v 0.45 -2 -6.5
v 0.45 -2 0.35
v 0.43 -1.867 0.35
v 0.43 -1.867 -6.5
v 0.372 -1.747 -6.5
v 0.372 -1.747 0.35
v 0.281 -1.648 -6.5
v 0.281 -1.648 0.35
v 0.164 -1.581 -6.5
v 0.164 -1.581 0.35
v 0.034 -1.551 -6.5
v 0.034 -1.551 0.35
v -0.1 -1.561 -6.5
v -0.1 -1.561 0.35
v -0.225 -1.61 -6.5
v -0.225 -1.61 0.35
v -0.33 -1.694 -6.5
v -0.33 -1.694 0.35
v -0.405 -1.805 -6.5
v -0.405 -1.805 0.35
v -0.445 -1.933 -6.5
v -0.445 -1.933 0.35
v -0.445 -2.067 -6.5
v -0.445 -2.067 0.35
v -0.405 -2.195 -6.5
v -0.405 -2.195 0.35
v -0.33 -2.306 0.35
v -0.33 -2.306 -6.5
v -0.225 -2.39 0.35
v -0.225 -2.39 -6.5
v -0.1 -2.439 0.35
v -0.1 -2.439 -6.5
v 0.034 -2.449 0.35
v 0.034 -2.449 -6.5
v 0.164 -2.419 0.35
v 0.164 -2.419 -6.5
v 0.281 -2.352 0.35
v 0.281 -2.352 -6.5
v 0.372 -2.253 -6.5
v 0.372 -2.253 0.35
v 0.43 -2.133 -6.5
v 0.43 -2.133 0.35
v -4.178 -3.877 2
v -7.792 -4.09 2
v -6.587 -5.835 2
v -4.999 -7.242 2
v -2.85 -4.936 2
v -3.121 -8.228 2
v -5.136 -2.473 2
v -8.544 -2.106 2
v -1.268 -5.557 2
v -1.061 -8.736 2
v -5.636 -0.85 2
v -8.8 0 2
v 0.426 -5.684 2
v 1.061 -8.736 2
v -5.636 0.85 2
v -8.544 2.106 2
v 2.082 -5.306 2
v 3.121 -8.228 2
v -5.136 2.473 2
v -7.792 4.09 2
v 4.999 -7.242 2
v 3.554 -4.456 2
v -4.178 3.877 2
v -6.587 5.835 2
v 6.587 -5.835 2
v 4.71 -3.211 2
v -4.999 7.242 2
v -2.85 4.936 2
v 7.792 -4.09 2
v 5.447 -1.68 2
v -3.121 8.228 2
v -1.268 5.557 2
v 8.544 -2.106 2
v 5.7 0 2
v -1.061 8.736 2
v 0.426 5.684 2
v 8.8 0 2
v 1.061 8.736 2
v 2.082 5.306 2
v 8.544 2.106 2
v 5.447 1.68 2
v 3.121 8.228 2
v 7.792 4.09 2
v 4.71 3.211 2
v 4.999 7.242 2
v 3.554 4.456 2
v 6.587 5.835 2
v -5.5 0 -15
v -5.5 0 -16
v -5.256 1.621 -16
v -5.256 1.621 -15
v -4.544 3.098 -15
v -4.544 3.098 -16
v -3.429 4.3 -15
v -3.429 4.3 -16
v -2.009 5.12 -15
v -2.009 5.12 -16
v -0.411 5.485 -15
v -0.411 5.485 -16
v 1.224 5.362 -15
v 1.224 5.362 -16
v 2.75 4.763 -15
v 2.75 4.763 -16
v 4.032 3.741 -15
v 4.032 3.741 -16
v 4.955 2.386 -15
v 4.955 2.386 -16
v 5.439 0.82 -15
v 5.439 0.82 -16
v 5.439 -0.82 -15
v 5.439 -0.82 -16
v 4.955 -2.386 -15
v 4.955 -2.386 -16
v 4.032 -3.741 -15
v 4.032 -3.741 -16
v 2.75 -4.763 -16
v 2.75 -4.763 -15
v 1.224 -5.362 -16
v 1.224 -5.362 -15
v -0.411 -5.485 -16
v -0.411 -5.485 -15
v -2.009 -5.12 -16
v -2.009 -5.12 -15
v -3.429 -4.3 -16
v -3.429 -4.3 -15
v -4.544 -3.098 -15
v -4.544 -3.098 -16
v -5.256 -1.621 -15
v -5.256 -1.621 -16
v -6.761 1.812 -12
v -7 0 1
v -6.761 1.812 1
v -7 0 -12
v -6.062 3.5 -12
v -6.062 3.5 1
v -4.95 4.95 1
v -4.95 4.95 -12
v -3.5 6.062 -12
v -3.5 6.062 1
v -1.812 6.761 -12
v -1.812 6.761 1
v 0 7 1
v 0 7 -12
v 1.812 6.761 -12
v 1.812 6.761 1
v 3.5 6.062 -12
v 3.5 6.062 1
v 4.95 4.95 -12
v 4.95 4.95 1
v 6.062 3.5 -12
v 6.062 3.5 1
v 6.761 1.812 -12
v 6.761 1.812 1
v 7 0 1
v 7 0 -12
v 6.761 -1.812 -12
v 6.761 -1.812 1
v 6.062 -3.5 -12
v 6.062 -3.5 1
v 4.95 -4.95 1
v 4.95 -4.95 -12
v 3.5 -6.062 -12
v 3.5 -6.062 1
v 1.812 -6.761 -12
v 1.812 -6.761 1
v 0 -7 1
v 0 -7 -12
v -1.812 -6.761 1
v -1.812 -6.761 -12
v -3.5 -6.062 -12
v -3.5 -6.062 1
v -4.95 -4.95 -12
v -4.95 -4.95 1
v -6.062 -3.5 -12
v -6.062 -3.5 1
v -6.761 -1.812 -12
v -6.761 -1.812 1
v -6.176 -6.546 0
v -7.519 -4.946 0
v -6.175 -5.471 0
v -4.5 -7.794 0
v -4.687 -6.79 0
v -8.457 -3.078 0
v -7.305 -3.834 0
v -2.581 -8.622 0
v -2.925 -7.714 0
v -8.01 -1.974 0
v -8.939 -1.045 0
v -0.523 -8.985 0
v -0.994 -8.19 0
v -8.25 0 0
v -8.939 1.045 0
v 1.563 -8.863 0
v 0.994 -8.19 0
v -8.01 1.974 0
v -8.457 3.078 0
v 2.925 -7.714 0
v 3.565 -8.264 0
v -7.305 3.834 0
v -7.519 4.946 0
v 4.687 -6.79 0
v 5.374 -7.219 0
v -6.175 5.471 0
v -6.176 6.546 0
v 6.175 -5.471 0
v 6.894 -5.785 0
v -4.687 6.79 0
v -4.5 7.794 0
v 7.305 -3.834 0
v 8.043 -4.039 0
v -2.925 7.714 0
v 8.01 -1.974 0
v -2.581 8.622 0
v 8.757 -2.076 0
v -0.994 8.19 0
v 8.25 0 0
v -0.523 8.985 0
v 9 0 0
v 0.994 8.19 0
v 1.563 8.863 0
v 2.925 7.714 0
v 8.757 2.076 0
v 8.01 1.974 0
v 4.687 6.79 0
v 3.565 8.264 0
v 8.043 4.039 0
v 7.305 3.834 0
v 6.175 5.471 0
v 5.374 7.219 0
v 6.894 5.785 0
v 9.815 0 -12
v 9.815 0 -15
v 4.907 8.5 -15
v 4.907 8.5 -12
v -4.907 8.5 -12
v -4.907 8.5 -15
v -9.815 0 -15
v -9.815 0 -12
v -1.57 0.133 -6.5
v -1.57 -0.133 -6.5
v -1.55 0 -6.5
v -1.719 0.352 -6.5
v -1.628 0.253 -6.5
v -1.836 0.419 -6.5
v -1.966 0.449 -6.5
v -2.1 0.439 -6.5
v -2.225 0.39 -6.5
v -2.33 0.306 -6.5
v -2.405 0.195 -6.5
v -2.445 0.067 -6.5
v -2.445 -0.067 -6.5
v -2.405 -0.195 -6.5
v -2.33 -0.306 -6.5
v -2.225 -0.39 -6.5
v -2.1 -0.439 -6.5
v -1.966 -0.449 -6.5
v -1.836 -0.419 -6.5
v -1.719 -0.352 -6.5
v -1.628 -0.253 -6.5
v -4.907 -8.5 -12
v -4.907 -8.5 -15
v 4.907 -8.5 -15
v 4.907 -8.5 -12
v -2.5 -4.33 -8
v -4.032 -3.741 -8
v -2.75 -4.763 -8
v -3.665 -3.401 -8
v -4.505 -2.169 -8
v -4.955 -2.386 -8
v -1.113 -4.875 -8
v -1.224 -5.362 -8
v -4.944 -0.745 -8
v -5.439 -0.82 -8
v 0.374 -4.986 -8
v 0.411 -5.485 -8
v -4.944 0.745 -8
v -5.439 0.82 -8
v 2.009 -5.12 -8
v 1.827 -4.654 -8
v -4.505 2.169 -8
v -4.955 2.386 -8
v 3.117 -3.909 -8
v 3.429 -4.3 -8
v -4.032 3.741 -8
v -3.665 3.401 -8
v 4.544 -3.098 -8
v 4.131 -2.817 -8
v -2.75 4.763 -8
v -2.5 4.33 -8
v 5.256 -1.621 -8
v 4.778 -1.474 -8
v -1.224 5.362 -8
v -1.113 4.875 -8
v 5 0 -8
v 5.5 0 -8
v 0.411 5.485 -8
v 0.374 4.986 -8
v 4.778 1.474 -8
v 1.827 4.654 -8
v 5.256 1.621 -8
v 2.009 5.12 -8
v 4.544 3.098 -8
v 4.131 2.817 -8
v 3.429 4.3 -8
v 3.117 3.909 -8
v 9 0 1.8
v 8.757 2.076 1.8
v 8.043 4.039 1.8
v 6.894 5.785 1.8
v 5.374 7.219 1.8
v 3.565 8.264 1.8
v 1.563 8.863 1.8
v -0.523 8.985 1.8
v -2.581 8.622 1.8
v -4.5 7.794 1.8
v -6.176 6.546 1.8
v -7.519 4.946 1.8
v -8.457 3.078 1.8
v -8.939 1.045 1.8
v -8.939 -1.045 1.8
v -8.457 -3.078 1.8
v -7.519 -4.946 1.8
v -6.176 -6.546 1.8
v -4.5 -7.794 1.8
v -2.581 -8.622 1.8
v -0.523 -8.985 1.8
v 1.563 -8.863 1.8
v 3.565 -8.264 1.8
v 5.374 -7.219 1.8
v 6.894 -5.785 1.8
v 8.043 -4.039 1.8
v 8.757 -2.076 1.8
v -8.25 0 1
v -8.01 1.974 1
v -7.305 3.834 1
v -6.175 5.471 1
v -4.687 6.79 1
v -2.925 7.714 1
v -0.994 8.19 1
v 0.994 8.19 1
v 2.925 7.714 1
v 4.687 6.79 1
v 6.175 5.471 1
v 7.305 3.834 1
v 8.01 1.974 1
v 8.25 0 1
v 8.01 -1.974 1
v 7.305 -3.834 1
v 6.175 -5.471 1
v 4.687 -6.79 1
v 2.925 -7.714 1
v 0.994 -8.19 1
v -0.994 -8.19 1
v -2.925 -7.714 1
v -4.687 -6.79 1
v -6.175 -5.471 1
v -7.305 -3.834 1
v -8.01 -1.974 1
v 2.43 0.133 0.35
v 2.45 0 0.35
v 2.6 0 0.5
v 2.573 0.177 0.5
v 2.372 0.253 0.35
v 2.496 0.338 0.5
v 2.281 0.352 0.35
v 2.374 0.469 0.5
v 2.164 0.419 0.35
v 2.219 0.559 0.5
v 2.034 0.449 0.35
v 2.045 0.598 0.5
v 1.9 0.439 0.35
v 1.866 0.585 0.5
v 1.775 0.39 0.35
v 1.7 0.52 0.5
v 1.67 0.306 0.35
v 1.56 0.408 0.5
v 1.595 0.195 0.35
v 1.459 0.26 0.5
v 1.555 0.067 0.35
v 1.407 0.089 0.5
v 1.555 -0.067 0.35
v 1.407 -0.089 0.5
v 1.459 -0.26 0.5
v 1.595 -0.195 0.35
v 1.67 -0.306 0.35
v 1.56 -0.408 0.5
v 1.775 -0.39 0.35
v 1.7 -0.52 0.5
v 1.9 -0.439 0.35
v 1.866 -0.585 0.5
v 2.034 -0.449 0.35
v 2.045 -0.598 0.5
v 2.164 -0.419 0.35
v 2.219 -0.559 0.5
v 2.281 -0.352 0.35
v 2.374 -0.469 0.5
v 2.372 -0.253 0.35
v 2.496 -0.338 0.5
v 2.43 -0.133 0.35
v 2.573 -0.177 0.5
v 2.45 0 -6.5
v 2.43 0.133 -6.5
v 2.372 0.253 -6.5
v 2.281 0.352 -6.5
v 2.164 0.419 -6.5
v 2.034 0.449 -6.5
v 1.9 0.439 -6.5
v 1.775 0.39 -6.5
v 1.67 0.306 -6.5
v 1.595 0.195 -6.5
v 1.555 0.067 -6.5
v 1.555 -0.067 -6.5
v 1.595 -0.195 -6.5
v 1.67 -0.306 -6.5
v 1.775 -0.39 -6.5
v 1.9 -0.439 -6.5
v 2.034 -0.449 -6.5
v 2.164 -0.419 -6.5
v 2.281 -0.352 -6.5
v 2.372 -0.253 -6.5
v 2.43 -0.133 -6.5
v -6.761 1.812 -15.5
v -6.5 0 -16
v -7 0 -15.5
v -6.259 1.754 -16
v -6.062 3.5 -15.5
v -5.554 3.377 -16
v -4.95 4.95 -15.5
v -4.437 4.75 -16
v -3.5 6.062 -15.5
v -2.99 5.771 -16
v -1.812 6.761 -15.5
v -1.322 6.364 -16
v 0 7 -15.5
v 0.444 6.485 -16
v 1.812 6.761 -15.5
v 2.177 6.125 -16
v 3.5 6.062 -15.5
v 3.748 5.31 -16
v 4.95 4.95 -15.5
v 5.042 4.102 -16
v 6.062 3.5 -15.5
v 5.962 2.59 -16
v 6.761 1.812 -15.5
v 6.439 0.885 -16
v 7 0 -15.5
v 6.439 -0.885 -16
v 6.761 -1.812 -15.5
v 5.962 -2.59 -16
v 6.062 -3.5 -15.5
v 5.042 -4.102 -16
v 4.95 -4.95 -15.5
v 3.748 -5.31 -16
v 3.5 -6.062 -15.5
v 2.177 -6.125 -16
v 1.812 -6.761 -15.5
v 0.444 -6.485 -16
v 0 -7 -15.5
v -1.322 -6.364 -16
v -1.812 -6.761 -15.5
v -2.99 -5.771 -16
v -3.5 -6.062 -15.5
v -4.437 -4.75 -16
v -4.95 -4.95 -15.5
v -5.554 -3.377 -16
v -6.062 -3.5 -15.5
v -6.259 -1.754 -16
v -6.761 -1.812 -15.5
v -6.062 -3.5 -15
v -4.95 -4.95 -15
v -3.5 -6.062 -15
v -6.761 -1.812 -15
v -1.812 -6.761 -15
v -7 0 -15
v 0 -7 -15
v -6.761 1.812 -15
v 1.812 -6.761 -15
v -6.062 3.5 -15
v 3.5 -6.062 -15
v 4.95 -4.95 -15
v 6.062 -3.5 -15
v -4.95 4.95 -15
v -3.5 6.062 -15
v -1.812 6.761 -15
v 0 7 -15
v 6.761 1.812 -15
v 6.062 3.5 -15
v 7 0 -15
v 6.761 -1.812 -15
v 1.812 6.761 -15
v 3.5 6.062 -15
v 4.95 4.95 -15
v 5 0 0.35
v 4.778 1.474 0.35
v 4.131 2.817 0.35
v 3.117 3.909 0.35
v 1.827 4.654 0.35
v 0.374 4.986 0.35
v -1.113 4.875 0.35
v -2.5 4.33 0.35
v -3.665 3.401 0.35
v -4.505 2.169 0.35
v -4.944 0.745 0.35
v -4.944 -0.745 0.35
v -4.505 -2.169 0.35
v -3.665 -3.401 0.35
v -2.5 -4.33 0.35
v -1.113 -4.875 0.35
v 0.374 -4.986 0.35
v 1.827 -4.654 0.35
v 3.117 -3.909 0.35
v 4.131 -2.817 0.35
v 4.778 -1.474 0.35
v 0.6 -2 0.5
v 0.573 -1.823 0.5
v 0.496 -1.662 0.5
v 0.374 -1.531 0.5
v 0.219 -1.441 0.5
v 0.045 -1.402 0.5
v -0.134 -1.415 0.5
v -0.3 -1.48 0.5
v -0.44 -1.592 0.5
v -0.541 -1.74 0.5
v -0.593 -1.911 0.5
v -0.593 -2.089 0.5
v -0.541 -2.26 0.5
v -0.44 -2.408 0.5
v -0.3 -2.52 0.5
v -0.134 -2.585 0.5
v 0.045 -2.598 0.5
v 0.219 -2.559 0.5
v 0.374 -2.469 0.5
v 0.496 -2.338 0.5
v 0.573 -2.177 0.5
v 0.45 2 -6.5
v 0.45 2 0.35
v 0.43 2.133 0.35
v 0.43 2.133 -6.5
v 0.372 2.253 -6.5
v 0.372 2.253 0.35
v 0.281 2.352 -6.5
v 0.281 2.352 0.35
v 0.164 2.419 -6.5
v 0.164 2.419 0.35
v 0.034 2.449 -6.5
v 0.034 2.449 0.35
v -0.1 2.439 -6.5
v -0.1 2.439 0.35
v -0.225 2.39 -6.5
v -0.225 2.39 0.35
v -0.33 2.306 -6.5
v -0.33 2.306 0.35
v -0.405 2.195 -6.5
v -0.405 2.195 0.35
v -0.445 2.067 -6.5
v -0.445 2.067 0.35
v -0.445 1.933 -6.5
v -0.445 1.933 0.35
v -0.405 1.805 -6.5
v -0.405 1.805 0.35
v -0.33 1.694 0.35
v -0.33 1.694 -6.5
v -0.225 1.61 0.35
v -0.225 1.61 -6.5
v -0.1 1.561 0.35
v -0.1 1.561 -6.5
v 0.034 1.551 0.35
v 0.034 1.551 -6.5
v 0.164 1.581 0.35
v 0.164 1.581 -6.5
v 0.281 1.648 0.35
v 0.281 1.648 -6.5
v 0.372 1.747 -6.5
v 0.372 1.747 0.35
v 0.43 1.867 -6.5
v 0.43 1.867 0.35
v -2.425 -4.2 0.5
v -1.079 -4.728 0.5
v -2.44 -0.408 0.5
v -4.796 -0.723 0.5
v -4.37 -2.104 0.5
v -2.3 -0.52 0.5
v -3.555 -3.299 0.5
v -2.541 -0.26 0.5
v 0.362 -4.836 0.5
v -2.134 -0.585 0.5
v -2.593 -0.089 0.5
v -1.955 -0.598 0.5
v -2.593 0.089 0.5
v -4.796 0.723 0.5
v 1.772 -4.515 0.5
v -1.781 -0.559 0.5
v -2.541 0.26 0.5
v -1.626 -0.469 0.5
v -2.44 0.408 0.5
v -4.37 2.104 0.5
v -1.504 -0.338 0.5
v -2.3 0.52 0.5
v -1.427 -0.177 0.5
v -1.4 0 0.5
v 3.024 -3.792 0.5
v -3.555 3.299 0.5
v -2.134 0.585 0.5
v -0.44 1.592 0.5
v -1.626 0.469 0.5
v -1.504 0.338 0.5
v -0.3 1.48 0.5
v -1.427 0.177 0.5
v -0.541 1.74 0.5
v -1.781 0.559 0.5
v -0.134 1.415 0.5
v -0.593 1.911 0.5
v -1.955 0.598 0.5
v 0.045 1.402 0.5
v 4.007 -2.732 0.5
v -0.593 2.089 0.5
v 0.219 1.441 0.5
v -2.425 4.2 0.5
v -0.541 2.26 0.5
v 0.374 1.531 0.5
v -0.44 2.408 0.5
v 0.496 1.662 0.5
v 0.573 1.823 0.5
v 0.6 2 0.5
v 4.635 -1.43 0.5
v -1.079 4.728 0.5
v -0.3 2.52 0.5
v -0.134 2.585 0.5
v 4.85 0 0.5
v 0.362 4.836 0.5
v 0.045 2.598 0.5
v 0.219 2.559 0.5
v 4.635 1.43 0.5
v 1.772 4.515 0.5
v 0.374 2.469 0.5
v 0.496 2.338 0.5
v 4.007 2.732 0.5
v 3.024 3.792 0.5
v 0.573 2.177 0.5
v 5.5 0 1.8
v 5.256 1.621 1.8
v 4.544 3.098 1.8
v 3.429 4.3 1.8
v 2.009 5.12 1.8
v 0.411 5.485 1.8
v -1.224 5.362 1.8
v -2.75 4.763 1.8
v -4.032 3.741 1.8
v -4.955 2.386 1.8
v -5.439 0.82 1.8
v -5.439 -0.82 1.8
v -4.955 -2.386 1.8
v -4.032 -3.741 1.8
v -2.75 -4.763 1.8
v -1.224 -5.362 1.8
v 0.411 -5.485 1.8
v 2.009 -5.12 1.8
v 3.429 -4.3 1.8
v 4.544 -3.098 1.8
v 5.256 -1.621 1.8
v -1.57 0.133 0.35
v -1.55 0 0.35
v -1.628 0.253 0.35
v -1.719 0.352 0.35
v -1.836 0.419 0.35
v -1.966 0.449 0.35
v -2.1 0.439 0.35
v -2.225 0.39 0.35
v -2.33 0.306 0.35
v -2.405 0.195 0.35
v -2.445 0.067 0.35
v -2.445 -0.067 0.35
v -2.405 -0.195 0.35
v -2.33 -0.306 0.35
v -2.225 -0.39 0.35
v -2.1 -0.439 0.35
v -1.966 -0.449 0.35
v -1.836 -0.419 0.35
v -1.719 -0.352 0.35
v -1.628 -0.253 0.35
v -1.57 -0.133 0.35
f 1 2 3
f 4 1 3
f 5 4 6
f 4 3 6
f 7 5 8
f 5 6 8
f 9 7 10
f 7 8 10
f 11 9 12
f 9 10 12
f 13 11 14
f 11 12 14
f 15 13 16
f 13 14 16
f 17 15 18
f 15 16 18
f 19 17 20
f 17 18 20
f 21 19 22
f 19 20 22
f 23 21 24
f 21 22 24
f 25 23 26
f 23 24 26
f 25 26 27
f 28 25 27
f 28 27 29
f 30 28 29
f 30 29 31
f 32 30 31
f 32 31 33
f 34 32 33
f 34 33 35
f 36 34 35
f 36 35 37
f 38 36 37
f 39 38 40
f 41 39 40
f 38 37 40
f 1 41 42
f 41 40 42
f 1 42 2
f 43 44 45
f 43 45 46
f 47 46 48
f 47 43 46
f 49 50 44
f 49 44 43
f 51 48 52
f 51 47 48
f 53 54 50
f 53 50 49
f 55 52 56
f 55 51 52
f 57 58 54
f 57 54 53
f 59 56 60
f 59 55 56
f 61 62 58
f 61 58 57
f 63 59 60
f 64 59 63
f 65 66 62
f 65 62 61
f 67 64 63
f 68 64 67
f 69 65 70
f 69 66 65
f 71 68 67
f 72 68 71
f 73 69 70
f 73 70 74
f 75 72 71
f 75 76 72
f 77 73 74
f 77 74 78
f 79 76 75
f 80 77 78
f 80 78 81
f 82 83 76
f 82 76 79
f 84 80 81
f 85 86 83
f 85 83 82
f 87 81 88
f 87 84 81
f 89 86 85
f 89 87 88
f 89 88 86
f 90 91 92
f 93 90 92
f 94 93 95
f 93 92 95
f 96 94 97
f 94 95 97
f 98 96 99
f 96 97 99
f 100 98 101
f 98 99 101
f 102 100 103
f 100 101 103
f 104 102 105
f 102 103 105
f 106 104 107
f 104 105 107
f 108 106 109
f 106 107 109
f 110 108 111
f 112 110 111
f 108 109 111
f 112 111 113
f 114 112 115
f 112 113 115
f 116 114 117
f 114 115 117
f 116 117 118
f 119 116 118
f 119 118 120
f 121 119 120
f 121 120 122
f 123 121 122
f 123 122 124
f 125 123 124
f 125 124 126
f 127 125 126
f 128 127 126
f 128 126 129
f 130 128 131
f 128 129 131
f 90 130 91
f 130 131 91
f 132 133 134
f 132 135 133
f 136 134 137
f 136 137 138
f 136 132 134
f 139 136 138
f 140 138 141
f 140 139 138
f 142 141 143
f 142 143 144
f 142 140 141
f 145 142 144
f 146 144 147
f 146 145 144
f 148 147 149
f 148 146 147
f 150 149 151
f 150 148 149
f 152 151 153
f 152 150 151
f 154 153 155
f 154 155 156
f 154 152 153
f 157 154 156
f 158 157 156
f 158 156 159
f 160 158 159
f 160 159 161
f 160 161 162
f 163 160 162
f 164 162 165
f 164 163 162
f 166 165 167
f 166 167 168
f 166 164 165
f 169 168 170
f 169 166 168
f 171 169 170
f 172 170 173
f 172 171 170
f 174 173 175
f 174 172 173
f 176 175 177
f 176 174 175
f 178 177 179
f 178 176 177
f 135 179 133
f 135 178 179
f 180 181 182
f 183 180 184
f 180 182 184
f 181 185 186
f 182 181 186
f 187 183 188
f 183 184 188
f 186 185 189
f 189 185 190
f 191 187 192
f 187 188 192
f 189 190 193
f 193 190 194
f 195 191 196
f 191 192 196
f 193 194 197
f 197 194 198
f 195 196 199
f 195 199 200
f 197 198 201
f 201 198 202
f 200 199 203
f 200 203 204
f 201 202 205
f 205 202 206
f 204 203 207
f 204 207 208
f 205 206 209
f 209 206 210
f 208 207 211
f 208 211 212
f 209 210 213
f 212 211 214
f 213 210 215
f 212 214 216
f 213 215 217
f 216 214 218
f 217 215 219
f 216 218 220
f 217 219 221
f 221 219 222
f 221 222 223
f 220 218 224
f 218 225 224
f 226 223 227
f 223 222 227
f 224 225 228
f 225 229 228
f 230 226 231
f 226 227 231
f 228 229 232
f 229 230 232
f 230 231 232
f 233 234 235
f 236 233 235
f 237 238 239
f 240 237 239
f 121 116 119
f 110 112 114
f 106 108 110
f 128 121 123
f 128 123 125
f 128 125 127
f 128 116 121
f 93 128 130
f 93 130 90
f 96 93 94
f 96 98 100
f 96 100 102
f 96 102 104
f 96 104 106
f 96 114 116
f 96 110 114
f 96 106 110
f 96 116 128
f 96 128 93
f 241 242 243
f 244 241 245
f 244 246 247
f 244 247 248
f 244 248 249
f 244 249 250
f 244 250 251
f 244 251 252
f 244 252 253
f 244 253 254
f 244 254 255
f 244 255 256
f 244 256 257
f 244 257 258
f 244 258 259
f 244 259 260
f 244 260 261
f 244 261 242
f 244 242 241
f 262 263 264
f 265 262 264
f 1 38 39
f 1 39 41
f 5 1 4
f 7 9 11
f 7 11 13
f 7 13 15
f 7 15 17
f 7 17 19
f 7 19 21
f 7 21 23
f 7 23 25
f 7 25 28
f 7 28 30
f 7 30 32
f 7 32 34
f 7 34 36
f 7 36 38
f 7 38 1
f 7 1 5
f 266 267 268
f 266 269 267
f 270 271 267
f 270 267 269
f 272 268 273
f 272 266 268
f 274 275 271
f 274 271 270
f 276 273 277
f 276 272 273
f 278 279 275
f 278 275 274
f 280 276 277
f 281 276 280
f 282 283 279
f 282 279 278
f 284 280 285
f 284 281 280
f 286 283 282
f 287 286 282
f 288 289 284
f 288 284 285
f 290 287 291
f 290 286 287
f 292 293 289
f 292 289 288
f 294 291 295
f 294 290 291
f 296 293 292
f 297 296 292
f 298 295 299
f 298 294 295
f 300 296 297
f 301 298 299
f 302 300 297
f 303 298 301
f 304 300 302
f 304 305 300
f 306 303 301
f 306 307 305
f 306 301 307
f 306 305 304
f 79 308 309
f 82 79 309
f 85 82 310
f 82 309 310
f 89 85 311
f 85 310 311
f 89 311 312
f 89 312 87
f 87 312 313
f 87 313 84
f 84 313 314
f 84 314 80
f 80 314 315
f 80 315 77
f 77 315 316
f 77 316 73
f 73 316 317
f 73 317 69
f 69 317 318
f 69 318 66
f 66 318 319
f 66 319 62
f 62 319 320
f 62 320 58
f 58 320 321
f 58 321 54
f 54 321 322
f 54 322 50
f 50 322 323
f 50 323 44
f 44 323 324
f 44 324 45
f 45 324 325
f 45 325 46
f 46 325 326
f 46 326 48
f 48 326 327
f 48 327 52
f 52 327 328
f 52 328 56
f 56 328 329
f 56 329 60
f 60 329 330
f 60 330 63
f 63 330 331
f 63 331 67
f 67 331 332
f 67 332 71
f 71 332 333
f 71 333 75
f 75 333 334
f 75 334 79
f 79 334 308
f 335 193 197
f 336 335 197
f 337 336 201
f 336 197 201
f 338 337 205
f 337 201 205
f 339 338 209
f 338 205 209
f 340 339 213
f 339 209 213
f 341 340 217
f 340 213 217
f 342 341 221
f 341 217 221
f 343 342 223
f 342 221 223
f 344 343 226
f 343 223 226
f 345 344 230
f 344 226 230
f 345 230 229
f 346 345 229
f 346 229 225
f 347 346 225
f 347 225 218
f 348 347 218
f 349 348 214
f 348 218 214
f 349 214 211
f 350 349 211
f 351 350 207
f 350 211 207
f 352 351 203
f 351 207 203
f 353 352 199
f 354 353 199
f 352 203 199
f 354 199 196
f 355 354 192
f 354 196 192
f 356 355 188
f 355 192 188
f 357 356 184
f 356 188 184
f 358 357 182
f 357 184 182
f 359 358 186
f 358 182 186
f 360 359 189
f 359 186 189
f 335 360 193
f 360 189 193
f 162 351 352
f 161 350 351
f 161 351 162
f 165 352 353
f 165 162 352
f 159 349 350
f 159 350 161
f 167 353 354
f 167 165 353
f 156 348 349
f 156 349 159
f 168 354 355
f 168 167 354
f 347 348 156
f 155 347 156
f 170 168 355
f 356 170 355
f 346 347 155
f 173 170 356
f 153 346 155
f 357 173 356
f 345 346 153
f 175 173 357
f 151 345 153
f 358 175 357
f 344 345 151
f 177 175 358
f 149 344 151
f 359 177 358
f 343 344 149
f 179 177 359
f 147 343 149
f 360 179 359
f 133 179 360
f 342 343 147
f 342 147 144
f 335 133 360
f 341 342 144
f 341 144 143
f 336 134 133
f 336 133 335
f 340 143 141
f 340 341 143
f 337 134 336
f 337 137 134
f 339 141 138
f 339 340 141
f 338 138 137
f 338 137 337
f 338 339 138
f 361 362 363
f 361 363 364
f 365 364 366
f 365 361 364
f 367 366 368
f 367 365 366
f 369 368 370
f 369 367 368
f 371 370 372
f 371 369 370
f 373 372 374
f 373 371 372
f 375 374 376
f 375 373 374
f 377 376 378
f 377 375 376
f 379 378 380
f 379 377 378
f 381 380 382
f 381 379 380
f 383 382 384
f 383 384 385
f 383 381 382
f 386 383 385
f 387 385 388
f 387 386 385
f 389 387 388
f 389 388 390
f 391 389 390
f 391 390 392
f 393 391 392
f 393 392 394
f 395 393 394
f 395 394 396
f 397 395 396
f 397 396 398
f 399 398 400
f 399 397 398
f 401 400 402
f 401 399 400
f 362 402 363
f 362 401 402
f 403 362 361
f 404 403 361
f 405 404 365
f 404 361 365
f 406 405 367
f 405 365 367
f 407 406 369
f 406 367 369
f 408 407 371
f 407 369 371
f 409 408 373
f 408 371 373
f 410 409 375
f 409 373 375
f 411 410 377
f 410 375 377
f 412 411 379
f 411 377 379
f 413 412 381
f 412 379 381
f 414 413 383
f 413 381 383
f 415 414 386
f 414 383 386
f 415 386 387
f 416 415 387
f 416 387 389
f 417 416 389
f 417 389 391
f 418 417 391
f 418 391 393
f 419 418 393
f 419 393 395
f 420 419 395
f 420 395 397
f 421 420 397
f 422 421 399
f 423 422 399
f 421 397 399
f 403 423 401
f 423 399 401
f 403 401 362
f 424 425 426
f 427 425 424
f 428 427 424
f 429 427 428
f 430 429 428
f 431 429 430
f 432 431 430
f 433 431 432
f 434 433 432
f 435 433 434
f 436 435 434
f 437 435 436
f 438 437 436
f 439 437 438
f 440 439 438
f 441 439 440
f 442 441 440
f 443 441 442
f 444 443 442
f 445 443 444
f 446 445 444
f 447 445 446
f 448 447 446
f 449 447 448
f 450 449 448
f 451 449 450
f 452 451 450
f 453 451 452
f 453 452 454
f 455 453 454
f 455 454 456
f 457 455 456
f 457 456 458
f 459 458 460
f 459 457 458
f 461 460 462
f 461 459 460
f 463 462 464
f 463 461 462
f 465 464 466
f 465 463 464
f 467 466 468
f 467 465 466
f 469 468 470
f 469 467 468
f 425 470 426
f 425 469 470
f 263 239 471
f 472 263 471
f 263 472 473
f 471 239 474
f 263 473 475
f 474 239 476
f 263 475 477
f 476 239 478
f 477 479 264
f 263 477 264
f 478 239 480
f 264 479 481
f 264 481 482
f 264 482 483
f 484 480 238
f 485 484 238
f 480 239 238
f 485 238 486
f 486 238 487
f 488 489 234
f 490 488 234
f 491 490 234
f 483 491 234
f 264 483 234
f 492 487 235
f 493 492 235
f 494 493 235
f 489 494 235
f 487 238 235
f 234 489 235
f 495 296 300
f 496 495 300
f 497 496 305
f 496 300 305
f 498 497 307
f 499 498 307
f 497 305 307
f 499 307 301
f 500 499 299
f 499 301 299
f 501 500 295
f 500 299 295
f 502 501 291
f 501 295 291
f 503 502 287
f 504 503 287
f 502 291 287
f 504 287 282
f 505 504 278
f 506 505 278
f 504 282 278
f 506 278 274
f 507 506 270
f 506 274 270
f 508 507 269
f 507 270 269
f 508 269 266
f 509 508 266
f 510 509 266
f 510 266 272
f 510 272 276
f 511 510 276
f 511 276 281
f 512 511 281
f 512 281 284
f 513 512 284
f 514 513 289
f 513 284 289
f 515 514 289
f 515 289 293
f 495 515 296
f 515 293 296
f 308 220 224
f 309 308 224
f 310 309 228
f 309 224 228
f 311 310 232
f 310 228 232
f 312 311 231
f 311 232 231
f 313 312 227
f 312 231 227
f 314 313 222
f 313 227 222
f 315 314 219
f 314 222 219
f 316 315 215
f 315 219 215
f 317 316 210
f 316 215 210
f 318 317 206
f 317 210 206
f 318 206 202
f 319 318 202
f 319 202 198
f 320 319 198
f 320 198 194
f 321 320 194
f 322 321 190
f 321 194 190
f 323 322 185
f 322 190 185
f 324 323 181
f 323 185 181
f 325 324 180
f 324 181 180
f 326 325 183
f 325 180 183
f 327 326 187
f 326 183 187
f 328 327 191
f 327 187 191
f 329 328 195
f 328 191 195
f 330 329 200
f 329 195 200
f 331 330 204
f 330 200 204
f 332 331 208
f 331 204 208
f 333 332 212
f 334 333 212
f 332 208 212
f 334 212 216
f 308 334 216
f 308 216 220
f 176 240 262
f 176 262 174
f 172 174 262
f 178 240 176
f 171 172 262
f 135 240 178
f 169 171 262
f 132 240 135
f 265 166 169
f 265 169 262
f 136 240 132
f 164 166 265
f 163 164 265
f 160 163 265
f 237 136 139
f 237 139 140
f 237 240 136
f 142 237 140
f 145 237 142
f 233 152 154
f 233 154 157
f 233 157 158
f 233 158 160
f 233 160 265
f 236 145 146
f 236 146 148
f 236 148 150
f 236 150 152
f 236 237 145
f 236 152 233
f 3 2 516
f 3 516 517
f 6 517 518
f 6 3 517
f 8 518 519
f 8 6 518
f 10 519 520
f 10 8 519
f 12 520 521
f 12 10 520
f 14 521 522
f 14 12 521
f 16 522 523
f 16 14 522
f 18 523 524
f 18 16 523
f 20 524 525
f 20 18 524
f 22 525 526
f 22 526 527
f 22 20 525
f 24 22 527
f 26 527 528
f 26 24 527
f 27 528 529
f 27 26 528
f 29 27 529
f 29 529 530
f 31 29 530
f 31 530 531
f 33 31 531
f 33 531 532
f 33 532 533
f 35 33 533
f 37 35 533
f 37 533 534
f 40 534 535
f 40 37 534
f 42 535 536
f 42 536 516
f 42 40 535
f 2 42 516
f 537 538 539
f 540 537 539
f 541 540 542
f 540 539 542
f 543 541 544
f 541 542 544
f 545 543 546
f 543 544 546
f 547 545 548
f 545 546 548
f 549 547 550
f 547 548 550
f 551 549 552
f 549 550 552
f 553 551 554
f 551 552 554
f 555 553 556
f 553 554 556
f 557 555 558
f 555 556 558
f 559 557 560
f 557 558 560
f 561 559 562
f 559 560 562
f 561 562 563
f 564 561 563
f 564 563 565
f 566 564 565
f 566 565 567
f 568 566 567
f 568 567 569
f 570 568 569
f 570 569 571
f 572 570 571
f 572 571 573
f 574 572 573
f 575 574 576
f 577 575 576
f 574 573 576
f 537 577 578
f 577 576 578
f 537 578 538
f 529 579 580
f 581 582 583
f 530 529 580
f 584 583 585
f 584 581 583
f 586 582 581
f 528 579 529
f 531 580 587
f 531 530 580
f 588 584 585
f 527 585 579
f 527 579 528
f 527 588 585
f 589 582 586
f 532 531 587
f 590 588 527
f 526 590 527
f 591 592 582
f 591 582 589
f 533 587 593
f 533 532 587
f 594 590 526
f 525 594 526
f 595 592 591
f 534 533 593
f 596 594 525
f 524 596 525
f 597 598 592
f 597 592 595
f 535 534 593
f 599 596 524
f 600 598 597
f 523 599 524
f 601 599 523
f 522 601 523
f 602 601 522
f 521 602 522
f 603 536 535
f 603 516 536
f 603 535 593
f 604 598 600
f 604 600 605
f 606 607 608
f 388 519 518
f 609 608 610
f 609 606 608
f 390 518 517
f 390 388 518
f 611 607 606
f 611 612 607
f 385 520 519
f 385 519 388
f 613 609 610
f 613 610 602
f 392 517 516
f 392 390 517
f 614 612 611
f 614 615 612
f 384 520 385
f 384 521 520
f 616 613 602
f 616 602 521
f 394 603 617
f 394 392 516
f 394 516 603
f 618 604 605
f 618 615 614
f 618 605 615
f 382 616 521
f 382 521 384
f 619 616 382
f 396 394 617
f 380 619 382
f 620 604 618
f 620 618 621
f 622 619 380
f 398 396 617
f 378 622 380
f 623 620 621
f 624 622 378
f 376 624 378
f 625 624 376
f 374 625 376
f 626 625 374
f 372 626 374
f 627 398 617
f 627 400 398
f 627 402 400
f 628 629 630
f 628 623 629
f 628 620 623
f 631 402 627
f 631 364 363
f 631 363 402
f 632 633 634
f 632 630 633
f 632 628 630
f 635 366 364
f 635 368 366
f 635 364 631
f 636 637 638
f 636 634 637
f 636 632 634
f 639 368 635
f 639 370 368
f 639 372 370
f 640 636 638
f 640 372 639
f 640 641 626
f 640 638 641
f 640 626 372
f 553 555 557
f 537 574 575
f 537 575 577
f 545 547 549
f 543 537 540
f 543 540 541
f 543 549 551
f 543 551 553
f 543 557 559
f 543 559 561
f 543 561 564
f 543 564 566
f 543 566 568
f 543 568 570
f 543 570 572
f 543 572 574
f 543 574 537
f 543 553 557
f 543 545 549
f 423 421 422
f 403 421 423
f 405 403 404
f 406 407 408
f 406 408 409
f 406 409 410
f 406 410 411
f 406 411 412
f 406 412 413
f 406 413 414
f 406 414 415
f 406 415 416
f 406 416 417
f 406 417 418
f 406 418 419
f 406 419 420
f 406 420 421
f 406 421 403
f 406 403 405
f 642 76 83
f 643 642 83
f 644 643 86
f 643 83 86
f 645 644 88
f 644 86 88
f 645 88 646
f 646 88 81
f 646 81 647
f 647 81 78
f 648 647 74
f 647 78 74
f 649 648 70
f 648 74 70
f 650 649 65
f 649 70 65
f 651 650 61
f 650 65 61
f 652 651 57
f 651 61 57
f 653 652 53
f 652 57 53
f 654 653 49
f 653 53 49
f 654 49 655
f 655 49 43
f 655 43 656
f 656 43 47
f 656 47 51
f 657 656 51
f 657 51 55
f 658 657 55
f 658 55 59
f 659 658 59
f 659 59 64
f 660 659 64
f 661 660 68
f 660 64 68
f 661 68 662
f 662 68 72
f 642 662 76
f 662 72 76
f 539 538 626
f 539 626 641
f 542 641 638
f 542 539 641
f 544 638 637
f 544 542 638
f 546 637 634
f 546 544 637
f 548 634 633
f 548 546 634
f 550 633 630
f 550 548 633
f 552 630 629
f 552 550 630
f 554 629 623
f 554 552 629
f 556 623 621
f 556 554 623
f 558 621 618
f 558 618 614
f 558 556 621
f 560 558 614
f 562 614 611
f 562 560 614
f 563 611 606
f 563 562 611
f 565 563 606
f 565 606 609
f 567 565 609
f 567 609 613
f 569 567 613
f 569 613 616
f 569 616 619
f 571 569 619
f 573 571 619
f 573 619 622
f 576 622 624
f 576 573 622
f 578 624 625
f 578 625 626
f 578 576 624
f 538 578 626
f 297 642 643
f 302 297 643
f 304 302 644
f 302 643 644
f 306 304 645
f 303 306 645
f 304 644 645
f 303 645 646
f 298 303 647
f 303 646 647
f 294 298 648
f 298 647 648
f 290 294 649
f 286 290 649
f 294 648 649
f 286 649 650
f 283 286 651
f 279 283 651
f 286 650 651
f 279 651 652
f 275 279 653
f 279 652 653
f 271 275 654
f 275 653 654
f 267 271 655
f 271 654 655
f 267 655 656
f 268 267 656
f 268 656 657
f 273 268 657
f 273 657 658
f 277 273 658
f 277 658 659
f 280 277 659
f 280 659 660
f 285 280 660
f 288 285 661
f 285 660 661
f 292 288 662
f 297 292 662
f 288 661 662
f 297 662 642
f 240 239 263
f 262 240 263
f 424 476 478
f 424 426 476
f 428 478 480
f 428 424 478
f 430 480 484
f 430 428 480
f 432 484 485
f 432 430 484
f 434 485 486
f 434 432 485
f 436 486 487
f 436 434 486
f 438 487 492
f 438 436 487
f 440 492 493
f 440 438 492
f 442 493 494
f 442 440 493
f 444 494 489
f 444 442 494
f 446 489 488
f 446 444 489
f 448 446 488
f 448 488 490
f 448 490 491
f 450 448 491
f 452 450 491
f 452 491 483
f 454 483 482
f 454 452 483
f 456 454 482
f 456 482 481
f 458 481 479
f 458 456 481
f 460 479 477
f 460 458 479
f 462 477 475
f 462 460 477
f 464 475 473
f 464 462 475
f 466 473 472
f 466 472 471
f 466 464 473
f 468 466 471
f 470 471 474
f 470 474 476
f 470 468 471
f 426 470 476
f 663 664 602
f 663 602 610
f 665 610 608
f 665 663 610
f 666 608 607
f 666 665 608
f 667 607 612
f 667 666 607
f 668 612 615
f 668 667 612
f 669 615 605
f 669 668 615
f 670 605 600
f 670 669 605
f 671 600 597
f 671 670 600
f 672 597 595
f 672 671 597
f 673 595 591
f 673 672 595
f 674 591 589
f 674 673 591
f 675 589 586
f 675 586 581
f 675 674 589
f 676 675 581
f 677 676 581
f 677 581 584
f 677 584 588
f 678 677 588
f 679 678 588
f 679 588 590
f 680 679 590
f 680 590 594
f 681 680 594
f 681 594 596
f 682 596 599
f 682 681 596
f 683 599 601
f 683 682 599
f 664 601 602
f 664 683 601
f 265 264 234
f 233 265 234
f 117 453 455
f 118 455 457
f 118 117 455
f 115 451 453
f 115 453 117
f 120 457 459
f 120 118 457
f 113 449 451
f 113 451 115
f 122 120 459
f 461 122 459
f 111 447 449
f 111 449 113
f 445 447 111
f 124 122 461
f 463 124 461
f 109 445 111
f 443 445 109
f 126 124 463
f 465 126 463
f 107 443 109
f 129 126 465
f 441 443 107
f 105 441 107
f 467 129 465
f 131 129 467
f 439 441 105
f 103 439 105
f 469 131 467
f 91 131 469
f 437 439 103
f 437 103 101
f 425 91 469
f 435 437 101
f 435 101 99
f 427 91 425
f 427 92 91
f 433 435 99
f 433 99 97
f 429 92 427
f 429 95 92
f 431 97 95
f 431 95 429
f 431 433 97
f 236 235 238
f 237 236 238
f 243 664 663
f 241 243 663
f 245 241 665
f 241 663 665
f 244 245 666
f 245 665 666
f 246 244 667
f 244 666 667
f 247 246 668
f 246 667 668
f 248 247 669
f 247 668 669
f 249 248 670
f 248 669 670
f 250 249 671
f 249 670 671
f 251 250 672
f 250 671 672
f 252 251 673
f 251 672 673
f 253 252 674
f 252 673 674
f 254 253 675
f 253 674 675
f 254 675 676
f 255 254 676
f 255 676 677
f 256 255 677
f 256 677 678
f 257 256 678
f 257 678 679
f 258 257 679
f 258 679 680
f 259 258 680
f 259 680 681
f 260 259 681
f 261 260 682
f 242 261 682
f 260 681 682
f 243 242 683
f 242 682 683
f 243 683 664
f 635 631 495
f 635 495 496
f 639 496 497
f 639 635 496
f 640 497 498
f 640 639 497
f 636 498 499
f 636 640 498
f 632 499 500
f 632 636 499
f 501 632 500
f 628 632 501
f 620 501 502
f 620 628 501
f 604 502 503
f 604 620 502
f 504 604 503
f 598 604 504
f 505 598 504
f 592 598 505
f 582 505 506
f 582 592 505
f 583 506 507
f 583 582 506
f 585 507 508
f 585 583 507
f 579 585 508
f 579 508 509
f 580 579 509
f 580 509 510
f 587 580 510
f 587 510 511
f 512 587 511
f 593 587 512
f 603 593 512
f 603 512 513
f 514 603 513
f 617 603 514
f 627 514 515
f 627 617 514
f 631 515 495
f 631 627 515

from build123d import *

# Parameters (mm, degrees)
SKETCH1_R          = 9
EXTRUDE1_DEPTH     = 2
SKETCH4_R          = 7
EXTRUDE2_DEPTH     = 16
SKETCH2_R          = 5.5
CUT_EXTRUDE1_DEPTH = 10
SKETCH3_R          = 8.25
SKETCH3_R_2        = 7
CUT_EXTRUDE2_DEPTH = 1
SKETCH5_R          = 5
EXTRUDE3_DEPTH     = 8.5
SKETCH6_R          = 0.45
CUT_EXTRUDE3_DEPTH = 7
CHAMFER2_SIZE      = 0.15
CHAMFER1_SIZE      = 0.2
SKETCH7_R          = 5.5
CUT_EXTRUDE4_DEPTH = 1
CHAMFER3_SIZE      = 0.5
EXTRUDE4_DEPTH     = 3


with BuildPart() as part:
    # Sketch1 → Extrude1 (new body)
    with BuildSketch(Plane.XY):
        Circle(SKETCH1_R)
    extrude(amount=EXTRUDE1_DEPTH)

    # Sketch4 → Extrude2 (add)
    with BuildSketch(Plane(origin=(0, 0, 0), x_dir=(-1, 0, 0), z_dir=(0, 0, -1))):
        Circle(SKETCH4_R)
    extrude(amount=EXTRUDE2_DEPTH)

    # Sketch2 → Cut-Extrude1 (cut)
    with BuildSketch(Plane.XY.offset(2)):
        Circle(SKETCH2_R)
    extrude(amount=-CUT_EXTRUDE1_DEPTH, mode=Mode.SUBTRACT)

    # Sketch3 → Cut-Extrude2 (cut)
    with BuildSketch(Plane(origin=(0, 0, 0), x_dir=(-1, 0, 0), z_dir=(0, 0, -1))):
        Circle(SKETCH3_R)
        Circle(SKETCH3_R_2, mode=Mode.SUBTRACT)
    extrude(amount=-CUT_EXTRUDE2_DEPTH, mode=Mode.SUBTRACT)

    # Sketch5 → Extrude3 (add)
    with BuildSketch(Plane.XY.offset(-8)):
        Circle(SKETCH5_R)
    extrude(amount=EXTRUDE3_DEPTH)

    # Sketch6 → Cut-Extrude3 (cut)
    with BuildSketch(Plane.XY.offset(0.5)):
        with Locations((0, 2)):
            Circle(SKETCH6_R)
        with Locations((0, -2)):
            Circle(SKETCH6_R)
        with Locations((2, 0)):
            Circle(SKETCH6_R)
        with Locations((-2, 0)):
            Circle(SKETCH6_R)
    extrude(amount=-CUT_EXTRUDE3_DEPTH, mode=Mode.SUBTRACT)

    # Chamfer2
    chamfer2_edges = [part.edges().sort_by_distance(p)[0] for p in [
        (-5, 0, 0.5),
        (-0.45, 2, 0.5),
        (-0.45, -2, 0.5),
        (1.55, 0, 0.5),
        (-2.45, 0, 0.5),
    ]]
    chamfer(chamfer2_edges, length=CHAMFER2_SIZE)

    # Chamfer1
    chamfer1_edges = [part.edges().sort_by_distance(p)[0] for p in [
        (-5.5, 0, 2),
        (-9, 0, 2),
    ]]
    chamfer(chamfer1_edges, length=CHAMFER1_SIZE)

    # Sketch7 → Cut-Extrude4 (cut)
    with BuildSketch(Plane(origin=(0, 0, -16), x_dir=(-1, 0, 0), z_dir=(0, 0, -1))):
        Circle(SKETCH7_R)
    extrude(amount=-CUT_EXTRUDE4_DEPTH, mode=Mode.SUBTRACT)

    # Chamfer3
    chamfer3_edges = [part.edges().sort_by_distance(p)[0] for p in [
        (7, 0, -16),
    ]]
    chamfer(chamfer3_edges, length=CHAMFER3_SIZE)

    # Sketch8 → Extrude4 (add)
    with BuildSketch(Plane(origin=(0, 0, -15), x_dir=(-1, 0, 0), z_dir=(0, 0, -1))):
        Polygon((-4.907477288, 8.5), (4.907477288, 8.5), (9.814954576, 0), (4.907477288, -8.5), (-4.907477288, -8.5), (-9.814954576, 0), align=None)
    extrude(amount=-EXTRUDE4_DEPTH)


solid = part.part
